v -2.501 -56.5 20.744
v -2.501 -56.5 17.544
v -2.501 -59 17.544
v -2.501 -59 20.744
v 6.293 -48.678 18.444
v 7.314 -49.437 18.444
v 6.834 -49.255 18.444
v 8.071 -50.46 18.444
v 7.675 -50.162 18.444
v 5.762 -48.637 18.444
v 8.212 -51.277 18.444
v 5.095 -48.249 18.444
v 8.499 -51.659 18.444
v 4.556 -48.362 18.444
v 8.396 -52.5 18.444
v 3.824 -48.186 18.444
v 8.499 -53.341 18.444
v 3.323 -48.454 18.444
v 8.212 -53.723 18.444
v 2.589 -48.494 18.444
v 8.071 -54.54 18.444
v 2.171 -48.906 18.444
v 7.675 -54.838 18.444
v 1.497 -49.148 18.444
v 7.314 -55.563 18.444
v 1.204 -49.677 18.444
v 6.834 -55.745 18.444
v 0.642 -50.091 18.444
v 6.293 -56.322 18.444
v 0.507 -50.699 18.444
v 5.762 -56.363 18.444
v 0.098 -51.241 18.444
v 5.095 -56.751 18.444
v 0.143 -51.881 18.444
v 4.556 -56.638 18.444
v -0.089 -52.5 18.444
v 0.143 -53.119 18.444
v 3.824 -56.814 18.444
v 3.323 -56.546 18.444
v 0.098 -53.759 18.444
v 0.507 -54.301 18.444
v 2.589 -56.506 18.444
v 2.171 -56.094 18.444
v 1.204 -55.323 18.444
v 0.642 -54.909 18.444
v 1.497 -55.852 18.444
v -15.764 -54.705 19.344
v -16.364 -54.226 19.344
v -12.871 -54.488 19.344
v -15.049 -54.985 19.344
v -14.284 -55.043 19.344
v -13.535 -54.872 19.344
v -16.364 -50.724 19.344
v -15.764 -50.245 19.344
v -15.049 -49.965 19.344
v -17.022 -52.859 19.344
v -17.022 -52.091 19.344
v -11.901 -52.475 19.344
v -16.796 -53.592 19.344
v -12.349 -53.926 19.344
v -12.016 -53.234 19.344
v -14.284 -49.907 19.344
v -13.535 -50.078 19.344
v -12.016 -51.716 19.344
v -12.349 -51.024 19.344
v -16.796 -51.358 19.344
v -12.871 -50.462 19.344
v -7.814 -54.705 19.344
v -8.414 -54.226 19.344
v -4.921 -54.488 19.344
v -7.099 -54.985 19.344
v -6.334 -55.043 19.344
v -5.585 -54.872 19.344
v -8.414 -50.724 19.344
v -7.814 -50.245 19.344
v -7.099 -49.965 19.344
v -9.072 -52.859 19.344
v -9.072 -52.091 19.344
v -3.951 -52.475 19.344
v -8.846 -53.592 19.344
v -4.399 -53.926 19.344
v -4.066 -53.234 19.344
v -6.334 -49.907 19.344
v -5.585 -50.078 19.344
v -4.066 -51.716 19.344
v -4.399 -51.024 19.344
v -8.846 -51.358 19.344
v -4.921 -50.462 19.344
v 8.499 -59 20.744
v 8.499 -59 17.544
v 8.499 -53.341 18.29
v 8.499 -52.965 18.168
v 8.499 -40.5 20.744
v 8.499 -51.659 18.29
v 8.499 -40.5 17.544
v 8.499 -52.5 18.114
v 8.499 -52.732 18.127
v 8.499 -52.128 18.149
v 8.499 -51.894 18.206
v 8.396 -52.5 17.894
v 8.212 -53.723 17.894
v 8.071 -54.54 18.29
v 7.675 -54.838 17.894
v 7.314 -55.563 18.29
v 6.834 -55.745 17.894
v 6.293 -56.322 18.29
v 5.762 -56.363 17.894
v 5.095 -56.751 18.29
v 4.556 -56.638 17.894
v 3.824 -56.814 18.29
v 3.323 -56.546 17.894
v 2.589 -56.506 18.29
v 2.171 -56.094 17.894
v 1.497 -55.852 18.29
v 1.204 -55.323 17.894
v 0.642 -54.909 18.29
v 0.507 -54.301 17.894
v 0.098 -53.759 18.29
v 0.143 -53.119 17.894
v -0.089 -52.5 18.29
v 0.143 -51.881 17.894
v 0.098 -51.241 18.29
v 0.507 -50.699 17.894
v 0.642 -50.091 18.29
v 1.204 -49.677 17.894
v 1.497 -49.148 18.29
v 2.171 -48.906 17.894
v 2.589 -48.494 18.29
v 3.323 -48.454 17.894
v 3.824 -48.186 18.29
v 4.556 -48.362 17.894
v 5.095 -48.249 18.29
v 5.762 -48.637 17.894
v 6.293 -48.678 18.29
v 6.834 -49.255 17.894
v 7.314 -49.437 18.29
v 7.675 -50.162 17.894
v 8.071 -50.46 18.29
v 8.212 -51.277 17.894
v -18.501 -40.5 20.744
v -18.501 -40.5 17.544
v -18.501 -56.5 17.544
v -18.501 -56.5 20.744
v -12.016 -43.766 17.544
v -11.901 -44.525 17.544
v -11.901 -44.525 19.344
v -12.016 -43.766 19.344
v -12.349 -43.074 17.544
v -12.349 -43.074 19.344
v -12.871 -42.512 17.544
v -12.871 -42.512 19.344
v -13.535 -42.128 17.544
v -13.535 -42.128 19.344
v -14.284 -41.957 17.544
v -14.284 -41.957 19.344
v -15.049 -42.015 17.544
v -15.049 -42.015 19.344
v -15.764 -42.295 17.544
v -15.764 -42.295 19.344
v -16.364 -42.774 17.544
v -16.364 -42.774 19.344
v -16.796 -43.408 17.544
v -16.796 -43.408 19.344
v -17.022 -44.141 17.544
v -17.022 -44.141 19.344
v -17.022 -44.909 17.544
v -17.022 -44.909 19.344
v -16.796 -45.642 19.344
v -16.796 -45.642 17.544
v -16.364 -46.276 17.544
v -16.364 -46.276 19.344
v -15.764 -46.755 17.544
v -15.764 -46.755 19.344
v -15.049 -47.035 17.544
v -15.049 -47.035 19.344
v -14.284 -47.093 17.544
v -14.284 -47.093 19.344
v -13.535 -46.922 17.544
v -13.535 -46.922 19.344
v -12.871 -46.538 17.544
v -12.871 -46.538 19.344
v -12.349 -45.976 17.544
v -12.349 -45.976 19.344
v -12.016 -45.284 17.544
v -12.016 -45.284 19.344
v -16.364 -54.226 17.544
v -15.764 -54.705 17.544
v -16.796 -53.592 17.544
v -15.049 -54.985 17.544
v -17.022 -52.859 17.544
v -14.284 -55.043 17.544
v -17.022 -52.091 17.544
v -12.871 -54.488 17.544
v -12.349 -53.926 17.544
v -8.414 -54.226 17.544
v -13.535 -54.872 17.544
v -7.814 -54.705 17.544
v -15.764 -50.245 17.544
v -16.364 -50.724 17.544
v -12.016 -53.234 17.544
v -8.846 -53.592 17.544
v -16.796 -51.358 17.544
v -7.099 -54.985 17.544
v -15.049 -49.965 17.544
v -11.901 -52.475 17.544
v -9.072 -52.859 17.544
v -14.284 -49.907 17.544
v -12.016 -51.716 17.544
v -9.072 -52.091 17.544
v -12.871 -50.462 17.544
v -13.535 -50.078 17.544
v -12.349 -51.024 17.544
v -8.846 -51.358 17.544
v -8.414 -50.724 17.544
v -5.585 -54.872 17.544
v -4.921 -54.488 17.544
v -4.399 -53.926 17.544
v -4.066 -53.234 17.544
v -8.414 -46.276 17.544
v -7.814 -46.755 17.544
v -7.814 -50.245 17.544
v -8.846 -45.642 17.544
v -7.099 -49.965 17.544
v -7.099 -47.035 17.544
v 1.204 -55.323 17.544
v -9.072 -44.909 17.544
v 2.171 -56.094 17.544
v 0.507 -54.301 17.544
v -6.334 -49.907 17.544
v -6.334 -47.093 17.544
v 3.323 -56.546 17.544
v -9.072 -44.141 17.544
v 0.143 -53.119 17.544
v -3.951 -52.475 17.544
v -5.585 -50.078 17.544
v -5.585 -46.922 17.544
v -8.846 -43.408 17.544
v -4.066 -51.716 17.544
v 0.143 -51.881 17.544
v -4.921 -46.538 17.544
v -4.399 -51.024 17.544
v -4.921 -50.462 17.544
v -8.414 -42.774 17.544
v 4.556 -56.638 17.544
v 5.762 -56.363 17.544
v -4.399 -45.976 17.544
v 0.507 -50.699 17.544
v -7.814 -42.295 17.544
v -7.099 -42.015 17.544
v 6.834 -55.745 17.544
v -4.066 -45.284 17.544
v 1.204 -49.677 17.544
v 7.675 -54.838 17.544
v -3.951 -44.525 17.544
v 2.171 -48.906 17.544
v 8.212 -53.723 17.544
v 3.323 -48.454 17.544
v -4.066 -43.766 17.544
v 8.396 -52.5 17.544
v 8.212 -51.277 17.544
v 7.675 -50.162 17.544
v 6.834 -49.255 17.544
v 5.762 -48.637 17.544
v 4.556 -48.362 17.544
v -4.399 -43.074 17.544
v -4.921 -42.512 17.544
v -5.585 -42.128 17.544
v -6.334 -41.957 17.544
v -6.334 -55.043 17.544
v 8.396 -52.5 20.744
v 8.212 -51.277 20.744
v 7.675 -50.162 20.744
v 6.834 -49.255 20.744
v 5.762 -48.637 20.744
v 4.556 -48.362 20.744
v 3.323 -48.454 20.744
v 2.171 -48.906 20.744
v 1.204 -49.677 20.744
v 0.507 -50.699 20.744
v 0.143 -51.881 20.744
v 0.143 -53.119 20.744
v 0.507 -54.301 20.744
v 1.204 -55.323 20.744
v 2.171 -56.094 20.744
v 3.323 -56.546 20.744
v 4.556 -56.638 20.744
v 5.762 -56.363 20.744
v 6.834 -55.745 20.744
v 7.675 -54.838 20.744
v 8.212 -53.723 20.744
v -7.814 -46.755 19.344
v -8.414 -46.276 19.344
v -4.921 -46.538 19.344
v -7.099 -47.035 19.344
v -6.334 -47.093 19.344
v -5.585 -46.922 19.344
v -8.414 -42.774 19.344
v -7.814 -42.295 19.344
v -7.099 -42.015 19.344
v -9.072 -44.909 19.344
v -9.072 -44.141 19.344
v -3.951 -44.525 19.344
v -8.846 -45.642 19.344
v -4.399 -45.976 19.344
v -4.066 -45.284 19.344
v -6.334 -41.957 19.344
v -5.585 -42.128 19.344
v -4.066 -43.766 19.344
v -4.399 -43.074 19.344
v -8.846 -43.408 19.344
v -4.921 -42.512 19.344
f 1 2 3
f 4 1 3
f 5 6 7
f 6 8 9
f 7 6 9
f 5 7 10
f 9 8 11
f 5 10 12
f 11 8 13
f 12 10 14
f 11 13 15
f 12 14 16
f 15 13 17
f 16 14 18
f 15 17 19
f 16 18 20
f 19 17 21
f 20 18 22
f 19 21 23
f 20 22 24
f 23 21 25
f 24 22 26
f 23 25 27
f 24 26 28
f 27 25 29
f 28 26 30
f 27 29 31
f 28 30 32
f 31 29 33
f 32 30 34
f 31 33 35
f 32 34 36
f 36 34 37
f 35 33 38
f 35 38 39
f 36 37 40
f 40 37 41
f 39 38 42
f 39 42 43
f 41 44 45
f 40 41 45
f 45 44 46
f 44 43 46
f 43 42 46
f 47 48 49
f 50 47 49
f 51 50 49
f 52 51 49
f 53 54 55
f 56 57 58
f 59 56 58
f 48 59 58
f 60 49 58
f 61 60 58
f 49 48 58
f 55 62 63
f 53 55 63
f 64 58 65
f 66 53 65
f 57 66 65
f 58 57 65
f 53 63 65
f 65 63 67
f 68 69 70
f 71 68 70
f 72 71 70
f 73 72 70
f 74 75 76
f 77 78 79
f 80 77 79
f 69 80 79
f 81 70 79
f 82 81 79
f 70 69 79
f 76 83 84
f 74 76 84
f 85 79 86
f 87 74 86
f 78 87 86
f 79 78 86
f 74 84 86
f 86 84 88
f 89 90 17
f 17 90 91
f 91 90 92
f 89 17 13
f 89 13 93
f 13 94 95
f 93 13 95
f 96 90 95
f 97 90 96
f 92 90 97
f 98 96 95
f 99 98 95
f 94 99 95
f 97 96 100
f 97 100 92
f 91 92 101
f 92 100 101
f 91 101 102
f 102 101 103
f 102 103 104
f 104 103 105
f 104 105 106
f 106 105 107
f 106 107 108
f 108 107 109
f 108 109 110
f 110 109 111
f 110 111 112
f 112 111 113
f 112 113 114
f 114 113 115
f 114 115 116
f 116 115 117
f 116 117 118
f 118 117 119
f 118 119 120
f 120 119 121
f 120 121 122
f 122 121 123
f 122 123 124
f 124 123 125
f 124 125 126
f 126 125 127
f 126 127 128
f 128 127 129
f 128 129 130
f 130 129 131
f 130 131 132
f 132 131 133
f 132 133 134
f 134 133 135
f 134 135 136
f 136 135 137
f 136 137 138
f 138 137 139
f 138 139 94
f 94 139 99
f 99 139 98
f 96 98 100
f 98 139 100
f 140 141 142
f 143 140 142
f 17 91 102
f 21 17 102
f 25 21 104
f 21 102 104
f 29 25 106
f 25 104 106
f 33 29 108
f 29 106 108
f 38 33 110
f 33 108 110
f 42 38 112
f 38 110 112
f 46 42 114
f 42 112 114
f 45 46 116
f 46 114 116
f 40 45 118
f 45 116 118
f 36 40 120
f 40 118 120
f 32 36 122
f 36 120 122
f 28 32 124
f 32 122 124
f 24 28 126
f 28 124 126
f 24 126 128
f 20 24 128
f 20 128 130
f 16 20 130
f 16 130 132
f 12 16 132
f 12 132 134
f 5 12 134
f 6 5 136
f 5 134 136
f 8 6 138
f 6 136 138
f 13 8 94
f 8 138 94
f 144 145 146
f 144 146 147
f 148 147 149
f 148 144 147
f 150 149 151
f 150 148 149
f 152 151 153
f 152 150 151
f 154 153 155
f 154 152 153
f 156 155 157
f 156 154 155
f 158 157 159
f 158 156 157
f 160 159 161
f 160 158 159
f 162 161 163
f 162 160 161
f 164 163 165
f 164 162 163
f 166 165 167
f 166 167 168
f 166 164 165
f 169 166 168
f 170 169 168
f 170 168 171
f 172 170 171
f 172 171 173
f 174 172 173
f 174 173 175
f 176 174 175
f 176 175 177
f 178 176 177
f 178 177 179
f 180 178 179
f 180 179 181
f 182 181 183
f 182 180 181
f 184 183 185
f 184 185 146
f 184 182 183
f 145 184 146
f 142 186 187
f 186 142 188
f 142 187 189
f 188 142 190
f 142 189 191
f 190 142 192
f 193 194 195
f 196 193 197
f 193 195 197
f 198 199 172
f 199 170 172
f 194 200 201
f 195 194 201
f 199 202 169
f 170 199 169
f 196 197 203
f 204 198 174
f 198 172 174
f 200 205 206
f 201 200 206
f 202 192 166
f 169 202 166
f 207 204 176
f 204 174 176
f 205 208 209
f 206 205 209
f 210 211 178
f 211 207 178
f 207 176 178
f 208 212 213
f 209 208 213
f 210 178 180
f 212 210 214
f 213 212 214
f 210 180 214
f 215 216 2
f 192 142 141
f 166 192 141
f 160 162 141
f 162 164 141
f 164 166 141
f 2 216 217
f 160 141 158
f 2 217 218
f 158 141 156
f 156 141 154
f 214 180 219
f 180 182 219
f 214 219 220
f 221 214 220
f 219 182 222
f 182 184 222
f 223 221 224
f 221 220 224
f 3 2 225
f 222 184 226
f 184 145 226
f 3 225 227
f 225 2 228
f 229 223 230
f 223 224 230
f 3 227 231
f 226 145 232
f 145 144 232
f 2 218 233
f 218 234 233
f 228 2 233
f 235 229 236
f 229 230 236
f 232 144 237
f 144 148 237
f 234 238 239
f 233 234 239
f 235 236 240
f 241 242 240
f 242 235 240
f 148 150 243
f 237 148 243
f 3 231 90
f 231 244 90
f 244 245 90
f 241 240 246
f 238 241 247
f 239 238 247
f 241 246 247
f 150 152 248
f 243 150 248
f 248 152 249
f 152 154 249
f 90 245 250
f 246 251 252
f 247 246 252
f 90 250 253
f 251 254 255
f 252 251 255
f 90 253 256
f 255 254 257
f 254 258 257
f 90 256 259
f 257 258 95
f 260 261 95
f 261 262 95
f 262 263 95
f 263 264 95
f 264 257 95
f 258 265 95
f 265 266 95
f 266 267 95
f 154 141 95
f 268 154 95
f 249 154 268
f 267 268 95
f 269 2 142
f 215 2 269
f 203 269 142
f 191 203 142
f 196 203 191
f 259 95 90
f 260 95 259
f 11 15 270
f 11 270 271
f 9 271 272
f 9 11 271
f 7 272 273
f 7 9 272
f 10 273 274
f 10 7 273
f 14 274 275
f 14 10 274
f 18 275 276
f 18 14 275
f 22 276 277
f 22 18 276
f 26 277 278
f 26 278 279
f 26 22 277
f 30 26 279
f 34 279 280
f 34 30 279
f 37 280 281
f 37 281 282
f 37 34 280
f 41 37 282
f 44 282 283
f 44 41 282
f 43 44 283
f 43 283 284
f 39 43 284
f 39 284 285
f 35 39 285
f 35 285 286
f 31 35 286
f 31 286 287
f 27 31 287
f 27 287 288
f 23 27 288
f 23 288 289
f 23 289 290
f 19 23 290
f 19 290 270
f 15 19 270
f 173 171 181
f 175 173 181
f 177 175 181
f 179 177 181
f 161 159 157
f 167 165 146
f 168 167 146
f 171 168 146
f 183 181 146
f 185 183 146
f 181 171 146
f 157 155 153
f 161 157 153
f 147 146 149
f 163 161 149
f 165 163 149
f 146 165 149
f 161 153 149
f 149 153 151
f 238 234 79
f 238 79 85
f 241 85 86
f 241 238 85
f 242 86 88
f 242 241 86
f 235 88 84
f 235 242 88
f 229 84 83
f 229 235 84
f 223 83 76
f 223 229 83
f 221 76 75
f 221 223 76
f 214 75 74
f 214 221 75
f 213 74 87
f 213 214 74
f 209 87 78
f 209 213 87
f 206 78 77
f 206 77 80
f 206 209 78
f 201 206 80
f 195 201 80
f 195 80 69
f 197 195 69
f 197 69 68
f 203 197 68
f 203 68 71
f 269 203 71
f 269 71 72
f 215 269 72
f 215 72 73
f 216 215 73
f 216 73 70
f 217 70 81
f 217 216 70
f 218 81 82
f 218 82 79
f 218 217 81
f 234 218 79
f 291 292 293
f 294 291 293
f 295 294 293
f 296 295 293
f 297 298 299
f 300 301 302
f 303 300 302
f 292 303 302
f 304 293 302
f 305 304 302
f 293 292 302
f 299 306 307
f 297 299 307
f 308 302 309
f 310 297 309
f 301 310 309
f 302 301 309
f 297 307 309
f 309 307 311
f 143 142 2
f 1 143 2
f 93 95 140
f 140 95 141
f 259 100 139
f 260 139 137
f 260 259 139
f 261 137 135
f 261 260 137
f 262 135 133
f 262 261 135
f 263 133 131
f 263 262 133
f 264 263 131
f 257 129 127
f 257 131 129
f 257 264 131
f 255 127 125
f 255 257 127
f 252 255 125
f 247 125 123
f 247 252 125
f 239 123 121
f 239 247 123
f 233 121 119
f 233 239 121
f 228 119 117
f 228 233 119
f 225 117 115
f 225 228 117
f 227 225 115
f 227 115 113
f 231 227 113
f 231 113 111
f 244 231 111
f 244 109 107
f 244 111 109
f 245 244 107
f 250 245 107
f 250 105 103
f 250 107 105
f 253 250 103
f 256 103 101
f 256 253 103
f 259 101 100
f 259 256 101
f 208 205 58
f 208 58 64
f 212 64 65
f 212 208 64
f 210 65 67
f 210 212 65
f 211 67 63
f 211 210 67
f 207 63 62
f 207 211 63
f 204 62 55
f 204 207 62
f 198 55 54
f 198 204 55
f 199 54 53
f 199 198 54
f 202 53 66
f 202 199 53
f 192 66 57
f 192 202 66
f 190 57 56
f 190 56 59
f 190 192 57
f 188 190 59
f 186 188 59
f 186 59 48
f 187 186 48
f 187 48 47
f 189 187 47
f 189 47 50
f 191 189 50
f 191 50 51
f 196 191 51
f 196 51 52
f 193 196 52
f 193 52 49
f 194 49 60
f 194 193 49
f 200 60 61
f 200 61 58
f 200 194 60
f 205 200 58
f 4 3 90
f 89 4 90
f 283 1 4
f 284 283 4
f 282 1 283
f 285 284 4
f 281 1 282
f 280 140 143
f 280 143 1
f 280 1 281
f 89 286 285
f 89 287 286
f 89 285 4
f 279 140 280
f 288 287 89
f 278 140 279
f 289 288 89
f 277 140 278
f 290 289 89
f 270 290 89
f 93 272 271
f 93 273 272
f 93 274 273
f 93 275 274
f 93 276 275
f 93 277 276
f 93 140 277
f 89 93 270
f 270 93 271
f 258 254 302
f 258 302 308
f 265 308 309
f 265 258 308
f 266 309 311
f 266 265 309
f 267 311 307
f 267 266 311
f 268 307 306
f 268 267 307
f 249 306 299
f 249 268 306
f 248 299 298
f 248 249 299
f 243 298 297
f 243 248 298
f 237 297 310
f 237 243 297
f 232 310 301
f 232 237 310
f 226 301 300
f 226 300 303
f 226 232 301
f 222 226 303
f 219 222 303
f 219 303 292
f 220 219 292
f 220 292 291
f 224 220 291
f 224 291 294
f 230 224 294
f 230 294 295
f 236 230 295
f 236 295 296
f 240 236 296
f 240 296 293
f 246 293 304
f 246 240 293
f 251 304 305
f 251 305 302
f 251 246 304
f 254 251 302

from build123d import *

# Parameters (mm, degrees)
SKETCH1_R           = 4.15
BOSS_EXTRUDE1_DEPTH = 3.2
SKETCH1_3_R         = 2.575
CUT_EXTRUDE1_DEPTH  = 1.8


with BuildPart() as part:
    # Sketch1 → Boss-Extrude1 (new body)
    with BuildSketch(Plane.XY.offset(17.54359624)):
        Polygon((8.498833186, -40.5), (-18.501166814, -40.5), (-18.501166814, -56.5), (-2.501166814, -56.5), (-2.501166814, -59), (8.498833186, -59), align=None)
        with Locations((4.246216621, -52.5)):
            Circle(SKETCH1_R, mode=Mode.SUBTRACT)
    extrude(amount=BOSS_EXTRUDE1_DEPTH)

    # Sketch2 → Cut-Revolve1 (revolve, cut)
    with BuildSketch(Plane(origin=(4.246216621, -52.5, 15.44359624), x_dir=(1, 0, 0), z_dir=(0, 1, 0))):
        Polygon((-3.899999957, -1.91392917), (-3.899999957, -3), (-4.335, -3), (-4.335, -2.846789772), align=None)
    revolve(axis=Axis((4.246216621, -52.5, 18.34359624), (0, 0, -1)), mode=Mode.SUBTRACT)

    # Sketch1<3> → Cut-Extrude1 (cut)
    with BuildSketch(Plane.XY.offset(17.54359624)):
        with Locations((-14.476166814, -44.525)):
            Circle(SKETCH1_3_R)
        with Locations((-6.526166814, -44.525)):
            Circle(SKETCH1_3_R)
        with Locations((-6.526166814, -52.475)):
            Circle(SKETCH1_3_R)
        with Locations((-14.476166814, -52.475)):
            Circle(SKETCH1_3_R)
    extrude(amount=CUT_EXTRUDE1_DEPTH, mode=Mode.SUBTRACT)


solid = part.part
